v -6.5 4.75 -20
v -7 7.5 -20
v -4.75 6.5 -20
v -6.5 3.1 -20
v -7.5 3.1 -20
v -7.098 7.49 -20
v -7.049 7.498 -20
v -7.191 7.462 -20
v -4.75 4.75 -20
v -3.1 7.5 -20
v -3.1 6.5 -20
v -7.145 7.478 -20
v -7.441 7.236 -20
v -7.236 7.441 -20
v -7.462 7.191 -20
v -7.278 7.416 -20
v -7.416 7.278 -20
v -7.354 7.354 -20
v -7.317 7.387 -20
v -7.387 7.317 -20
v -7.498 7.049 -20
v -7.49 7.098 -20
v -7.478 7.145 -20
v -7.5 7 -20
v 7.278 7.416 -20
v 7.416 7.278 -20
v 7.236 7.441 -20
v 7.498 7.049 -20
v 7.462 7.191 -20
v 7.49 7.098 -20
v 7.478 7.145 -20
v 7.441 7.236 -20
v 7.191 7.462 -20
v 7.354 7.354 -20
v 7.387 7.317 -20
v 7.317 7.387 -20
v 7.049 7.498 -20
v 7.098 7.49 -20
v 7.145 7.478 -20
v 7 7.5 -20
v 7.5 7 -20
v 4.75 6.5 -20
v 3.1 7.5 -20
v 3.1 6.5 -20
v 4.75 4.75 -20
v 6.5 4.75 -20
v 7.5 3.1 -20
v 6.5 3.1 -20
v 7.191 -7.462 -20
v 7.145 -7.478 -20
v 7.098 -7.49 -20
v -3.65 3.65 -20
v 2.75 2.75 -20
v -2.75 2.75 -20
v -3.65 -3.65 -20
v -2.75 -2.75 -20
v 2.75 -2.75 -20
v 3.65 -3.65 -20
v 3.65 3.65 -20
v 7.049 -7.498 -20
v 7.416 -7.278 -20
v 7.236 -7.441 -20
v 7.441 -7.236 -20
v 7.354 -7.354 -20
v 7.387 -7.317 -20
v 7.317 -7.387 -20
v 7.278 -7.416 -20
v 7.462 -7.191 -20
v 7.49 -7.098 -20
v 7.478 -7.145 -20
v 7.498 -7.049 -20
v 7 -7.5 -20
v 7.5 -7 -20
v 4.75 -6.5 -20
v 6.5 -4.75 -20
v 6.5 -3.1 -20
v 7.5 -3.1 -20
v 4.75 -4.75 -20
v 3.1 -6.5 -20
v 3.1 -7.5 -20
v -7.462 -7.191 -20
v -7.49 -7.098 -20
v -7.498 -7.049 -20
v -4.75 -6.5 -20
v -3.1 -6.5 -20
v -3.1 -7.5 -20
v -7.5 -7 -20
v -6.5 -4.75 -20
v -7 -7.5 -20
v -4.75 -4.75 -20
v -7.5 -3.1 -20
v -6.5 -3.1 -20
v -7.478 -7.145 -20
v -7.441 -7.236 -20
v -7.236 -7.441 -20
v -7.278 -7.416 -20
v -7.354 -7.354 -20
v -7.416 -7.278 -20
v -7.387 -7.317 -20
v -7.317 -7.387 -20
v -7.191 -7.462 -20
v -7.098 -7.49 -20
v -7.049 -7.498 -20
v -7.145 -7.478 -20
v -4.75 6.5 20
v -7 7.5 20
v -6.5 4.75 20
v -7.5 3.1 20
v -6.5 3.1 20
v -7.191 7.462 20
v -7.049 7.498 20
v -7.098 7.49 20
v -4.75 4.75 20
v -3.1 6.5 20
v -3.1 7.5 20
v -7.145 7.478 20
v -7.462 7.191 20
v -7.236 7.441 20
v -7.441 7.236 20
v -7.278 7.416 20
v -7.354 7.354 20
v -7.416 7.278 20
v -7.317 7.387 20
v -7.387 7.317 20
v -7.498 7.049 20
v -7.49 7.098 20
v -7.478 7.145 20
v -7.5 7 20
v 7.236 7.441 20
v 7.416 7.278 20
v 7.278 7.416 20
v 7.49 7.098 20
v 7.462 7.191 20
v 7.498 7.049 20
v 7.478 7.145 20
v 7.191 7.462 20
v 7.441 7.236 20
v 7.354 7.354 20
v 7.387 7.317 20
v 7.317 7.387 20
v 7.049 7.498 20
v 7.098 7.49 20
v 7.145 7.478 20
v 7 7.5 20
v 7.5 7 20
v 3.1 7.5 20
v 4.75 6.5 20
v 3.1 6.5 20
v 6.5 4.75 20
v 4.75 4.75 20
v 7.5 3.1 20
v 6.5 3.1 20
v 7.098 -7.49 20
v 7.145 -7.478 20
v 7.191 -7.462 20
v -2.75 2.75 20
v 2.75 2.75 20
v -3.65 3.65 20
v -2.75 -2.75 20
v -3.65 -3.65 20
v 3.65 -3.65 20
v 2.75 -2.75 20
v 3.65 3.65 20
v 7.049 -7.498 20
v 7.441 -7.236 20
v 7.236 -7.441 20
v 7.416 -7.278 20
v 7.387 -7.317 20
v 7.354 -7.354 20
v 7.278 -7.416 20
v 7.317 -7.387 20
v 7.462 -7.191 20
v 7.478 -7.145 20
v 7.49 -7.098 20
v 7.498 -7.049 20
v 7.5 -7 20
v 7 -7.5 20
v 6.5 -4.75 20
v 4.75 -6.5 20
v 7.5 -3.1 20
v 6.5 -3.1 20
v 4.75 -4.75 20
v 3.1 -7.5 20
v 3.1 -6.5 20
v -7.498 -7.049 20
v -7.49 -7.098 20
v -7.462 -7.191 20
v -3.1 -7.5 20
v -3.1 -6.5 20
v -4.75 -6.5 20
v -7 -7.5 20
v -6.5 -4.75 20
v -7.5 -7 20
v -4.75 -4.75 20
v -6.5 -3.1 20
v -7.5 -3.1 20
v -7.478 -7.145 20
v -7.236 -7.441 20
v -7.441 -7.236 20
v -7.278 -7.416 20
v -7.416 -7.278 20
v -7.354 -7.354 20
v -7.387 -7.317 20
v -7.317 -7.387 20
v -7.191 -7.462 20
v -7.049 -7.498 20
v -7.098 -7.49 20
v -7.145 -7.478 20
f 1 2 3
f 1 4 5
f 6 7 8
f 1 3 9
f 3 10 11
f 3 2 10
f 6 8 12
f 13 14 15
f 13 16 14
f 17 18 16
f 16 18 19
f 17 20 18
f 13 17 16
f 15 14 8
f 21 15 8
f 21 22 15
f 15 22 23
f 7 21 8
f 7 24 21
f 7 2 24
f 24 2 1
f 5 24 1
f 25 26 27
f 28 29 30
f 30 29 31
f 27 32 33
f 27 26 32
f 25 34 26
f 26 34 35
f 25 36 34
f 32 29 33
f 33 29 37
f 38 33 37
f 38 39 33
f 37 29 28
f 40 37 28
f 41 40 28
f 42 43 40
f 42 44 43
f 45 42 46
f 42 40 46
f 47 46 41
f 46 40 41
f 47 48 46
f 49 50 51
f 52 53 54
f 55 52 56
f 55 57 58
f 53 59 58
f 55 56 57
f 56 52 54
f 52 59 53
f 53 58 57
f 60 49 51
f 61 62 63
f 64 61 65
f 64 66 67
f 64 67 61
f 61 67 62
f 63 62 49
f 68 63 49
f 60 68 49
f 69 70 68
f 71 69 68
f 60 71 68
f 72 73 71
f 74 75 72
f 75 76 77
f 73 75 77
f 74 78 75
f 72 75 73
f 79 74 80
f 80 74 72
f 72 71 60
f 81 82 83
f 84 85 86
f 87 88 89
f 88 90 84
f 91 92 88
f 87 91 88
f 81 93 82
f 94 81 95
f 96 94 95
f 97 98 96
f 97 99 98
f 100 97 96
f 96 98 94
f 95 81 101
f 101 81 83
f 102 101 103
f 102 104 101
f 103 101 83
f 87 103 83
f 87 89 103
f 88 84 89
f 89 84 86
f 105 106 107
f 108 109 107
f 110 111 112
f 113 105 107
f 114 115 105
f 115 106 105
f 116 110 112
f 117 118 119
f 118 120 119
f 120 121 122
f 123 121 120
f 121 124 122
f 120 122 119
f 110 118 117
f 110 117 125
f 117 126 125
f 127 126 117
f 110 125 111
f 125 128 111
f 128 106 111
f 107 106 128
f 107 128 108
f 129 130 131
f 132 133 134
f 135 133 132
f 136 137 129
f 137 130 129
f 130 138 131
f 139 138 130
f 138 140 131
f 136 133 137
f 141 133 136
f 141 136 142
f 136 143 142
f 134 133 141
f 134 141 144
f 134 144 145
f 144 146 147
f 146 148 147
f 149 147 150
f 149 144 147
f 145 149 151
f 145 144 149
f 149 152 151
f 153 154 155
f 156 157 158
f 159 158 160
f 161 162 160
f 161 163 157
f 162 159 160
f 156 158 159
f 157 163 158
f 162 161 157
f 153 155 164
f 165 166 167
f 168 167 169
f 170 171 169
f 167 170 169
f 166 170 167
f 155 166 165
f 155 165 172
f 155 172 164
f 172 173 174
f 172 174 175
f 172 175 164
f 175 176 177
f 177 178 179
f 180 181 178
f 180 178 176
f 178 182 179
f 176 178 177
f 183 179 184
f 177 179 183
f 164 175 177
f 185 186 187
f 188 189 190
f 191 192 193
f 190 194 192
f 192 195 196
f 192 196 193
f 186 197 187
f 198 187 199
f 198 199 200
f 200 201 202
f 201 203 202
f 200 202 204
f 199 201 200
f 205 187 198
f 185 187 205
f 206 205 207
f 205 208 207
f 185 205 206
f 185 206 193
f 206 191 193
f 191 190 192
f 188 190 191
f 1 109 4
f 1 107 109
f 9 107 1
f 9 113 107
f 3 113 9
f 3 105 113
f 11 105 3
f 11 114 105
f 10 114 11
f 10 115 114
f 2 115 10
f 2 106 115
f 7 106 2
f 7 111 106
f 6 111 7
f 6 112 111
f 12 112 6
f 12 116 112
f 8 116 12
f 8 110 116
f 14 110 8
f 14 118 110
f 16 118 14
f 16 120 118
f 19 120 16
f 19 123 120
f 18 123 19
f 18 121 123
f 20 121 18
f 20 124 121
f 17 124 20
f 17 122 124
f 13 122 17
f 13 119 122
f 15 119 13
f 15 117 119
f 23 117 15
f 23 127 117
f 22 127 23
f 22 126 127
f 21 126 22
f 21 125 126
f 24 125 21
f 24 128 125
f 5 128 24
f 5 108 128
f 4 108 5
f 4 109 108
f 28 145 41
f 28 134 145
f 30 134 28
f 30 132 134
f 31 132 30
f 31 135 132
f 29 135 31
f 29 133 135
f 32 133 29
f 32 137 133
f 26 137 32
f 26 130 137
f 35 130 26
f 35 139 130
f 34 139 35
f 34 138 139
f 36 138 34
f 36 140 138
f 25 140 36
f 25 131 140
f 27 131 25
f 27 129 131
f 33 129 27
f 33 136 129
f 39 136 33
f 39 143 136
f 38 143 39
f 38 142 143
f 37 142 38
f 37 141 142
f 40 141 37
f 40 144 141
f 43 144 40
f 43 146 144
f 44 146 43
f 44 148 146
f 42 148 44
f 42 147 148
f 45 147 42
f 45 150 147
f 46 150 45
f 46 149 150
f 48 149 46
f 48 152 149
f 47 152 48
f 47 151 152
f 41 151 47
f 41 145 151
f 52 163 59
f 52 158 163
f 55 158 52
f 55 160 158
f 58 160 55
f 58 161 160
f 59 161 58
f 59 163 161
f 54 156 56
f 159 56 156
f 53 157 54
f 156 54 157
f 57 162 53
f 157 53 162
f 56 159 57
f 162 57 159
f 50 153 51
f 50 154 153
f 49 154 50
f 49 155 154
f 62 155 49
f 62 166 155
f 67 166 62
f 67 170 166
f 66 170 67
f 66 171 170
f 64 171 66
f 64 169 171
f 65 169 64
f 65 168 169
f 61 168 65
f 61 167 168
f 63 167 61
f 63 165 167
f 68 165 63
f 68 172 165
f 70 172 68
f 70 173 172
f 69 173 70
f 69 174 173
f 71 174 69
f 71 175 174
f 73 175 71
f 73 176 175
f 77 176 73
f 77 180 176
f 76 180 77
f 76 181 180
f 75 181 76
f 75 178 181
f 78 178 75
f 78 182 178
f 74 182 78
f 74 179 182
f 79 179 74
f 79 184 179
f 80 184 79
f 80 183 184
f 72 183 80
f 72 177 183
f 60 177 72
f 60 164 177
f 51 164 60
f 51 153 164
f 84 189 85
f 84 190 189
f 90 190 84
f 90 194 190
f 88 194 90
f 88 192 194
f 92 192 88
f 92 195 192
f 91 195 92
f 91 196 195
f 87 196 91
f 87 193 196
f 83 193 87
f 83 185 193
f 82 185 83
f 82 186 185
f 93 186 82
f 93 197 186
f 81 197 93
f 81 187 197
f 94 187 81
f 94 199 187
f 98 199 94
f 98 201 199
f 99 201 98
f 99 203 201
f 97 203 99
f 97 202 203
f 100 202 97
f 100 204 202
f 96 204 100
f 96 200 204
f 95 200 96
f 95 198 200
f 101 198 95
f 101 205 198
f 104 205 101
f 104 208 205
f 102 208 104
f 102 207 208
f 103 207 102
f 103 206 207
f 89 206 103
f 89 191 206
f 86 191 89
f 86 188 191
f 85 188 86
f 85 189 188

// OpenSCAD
$fn = 64;

size = 15;
length = 40;

bore_d = 3.3;

inner_chamber = 5.5;          // square
slot_opening = 6.2;           // at outer face
slot_channel = 9.5;           // internal channel width
lip_thickness = 1.0;          // depth from face to open up to channel
spar_thickness = 0.9;         // thickness between inner chamber and channel
corner_fillet = 0.5;

eps = 0.01;

module rounded_square_2d(w, r){
    // r-clamped
    rr = min(r, w/2 - eps);
    minkowski(){
        square([w-2*rr, w-2*rr], center=true);
        circle(r=rr);
    }
}

module profile_2d(){
    difference(){
        // Outer body with corner fillet
        rounded_square_2d(size, corner_fillet);

        // Central square inner chamber
        square([inner_chamber, inner_chamber], center=true);

        // Central round bore
        circle(d=bore_d);

        // 4 T-slots (N, E, S, W)
        for (a = [0, 90, 180, 270]){
            rotate(a){
                // Slot internal channel (starts after lip thickness from outer face)
                translate([0, size/2 - lip_thickness - ( (size/2 - lip_thickness) - (inner_chamber/2 + spar_thickness) )/2])
                    square([slot_channel, (size/2 - lip_thickness) - (inner_chamber/2 + spar_thickness)], center=true);

                // Slot opening (through lip region up to outer face)
                translate([0, size/2 - lip_thickness/2])
                    square([slot_opening, lip_thickness + eps], center=true);
            }
        }
    }
}

module extrusion(len){
    linear_extrude(height=len, center=true, convexity=10)
        profile_2d();
}

extrusion(length);
